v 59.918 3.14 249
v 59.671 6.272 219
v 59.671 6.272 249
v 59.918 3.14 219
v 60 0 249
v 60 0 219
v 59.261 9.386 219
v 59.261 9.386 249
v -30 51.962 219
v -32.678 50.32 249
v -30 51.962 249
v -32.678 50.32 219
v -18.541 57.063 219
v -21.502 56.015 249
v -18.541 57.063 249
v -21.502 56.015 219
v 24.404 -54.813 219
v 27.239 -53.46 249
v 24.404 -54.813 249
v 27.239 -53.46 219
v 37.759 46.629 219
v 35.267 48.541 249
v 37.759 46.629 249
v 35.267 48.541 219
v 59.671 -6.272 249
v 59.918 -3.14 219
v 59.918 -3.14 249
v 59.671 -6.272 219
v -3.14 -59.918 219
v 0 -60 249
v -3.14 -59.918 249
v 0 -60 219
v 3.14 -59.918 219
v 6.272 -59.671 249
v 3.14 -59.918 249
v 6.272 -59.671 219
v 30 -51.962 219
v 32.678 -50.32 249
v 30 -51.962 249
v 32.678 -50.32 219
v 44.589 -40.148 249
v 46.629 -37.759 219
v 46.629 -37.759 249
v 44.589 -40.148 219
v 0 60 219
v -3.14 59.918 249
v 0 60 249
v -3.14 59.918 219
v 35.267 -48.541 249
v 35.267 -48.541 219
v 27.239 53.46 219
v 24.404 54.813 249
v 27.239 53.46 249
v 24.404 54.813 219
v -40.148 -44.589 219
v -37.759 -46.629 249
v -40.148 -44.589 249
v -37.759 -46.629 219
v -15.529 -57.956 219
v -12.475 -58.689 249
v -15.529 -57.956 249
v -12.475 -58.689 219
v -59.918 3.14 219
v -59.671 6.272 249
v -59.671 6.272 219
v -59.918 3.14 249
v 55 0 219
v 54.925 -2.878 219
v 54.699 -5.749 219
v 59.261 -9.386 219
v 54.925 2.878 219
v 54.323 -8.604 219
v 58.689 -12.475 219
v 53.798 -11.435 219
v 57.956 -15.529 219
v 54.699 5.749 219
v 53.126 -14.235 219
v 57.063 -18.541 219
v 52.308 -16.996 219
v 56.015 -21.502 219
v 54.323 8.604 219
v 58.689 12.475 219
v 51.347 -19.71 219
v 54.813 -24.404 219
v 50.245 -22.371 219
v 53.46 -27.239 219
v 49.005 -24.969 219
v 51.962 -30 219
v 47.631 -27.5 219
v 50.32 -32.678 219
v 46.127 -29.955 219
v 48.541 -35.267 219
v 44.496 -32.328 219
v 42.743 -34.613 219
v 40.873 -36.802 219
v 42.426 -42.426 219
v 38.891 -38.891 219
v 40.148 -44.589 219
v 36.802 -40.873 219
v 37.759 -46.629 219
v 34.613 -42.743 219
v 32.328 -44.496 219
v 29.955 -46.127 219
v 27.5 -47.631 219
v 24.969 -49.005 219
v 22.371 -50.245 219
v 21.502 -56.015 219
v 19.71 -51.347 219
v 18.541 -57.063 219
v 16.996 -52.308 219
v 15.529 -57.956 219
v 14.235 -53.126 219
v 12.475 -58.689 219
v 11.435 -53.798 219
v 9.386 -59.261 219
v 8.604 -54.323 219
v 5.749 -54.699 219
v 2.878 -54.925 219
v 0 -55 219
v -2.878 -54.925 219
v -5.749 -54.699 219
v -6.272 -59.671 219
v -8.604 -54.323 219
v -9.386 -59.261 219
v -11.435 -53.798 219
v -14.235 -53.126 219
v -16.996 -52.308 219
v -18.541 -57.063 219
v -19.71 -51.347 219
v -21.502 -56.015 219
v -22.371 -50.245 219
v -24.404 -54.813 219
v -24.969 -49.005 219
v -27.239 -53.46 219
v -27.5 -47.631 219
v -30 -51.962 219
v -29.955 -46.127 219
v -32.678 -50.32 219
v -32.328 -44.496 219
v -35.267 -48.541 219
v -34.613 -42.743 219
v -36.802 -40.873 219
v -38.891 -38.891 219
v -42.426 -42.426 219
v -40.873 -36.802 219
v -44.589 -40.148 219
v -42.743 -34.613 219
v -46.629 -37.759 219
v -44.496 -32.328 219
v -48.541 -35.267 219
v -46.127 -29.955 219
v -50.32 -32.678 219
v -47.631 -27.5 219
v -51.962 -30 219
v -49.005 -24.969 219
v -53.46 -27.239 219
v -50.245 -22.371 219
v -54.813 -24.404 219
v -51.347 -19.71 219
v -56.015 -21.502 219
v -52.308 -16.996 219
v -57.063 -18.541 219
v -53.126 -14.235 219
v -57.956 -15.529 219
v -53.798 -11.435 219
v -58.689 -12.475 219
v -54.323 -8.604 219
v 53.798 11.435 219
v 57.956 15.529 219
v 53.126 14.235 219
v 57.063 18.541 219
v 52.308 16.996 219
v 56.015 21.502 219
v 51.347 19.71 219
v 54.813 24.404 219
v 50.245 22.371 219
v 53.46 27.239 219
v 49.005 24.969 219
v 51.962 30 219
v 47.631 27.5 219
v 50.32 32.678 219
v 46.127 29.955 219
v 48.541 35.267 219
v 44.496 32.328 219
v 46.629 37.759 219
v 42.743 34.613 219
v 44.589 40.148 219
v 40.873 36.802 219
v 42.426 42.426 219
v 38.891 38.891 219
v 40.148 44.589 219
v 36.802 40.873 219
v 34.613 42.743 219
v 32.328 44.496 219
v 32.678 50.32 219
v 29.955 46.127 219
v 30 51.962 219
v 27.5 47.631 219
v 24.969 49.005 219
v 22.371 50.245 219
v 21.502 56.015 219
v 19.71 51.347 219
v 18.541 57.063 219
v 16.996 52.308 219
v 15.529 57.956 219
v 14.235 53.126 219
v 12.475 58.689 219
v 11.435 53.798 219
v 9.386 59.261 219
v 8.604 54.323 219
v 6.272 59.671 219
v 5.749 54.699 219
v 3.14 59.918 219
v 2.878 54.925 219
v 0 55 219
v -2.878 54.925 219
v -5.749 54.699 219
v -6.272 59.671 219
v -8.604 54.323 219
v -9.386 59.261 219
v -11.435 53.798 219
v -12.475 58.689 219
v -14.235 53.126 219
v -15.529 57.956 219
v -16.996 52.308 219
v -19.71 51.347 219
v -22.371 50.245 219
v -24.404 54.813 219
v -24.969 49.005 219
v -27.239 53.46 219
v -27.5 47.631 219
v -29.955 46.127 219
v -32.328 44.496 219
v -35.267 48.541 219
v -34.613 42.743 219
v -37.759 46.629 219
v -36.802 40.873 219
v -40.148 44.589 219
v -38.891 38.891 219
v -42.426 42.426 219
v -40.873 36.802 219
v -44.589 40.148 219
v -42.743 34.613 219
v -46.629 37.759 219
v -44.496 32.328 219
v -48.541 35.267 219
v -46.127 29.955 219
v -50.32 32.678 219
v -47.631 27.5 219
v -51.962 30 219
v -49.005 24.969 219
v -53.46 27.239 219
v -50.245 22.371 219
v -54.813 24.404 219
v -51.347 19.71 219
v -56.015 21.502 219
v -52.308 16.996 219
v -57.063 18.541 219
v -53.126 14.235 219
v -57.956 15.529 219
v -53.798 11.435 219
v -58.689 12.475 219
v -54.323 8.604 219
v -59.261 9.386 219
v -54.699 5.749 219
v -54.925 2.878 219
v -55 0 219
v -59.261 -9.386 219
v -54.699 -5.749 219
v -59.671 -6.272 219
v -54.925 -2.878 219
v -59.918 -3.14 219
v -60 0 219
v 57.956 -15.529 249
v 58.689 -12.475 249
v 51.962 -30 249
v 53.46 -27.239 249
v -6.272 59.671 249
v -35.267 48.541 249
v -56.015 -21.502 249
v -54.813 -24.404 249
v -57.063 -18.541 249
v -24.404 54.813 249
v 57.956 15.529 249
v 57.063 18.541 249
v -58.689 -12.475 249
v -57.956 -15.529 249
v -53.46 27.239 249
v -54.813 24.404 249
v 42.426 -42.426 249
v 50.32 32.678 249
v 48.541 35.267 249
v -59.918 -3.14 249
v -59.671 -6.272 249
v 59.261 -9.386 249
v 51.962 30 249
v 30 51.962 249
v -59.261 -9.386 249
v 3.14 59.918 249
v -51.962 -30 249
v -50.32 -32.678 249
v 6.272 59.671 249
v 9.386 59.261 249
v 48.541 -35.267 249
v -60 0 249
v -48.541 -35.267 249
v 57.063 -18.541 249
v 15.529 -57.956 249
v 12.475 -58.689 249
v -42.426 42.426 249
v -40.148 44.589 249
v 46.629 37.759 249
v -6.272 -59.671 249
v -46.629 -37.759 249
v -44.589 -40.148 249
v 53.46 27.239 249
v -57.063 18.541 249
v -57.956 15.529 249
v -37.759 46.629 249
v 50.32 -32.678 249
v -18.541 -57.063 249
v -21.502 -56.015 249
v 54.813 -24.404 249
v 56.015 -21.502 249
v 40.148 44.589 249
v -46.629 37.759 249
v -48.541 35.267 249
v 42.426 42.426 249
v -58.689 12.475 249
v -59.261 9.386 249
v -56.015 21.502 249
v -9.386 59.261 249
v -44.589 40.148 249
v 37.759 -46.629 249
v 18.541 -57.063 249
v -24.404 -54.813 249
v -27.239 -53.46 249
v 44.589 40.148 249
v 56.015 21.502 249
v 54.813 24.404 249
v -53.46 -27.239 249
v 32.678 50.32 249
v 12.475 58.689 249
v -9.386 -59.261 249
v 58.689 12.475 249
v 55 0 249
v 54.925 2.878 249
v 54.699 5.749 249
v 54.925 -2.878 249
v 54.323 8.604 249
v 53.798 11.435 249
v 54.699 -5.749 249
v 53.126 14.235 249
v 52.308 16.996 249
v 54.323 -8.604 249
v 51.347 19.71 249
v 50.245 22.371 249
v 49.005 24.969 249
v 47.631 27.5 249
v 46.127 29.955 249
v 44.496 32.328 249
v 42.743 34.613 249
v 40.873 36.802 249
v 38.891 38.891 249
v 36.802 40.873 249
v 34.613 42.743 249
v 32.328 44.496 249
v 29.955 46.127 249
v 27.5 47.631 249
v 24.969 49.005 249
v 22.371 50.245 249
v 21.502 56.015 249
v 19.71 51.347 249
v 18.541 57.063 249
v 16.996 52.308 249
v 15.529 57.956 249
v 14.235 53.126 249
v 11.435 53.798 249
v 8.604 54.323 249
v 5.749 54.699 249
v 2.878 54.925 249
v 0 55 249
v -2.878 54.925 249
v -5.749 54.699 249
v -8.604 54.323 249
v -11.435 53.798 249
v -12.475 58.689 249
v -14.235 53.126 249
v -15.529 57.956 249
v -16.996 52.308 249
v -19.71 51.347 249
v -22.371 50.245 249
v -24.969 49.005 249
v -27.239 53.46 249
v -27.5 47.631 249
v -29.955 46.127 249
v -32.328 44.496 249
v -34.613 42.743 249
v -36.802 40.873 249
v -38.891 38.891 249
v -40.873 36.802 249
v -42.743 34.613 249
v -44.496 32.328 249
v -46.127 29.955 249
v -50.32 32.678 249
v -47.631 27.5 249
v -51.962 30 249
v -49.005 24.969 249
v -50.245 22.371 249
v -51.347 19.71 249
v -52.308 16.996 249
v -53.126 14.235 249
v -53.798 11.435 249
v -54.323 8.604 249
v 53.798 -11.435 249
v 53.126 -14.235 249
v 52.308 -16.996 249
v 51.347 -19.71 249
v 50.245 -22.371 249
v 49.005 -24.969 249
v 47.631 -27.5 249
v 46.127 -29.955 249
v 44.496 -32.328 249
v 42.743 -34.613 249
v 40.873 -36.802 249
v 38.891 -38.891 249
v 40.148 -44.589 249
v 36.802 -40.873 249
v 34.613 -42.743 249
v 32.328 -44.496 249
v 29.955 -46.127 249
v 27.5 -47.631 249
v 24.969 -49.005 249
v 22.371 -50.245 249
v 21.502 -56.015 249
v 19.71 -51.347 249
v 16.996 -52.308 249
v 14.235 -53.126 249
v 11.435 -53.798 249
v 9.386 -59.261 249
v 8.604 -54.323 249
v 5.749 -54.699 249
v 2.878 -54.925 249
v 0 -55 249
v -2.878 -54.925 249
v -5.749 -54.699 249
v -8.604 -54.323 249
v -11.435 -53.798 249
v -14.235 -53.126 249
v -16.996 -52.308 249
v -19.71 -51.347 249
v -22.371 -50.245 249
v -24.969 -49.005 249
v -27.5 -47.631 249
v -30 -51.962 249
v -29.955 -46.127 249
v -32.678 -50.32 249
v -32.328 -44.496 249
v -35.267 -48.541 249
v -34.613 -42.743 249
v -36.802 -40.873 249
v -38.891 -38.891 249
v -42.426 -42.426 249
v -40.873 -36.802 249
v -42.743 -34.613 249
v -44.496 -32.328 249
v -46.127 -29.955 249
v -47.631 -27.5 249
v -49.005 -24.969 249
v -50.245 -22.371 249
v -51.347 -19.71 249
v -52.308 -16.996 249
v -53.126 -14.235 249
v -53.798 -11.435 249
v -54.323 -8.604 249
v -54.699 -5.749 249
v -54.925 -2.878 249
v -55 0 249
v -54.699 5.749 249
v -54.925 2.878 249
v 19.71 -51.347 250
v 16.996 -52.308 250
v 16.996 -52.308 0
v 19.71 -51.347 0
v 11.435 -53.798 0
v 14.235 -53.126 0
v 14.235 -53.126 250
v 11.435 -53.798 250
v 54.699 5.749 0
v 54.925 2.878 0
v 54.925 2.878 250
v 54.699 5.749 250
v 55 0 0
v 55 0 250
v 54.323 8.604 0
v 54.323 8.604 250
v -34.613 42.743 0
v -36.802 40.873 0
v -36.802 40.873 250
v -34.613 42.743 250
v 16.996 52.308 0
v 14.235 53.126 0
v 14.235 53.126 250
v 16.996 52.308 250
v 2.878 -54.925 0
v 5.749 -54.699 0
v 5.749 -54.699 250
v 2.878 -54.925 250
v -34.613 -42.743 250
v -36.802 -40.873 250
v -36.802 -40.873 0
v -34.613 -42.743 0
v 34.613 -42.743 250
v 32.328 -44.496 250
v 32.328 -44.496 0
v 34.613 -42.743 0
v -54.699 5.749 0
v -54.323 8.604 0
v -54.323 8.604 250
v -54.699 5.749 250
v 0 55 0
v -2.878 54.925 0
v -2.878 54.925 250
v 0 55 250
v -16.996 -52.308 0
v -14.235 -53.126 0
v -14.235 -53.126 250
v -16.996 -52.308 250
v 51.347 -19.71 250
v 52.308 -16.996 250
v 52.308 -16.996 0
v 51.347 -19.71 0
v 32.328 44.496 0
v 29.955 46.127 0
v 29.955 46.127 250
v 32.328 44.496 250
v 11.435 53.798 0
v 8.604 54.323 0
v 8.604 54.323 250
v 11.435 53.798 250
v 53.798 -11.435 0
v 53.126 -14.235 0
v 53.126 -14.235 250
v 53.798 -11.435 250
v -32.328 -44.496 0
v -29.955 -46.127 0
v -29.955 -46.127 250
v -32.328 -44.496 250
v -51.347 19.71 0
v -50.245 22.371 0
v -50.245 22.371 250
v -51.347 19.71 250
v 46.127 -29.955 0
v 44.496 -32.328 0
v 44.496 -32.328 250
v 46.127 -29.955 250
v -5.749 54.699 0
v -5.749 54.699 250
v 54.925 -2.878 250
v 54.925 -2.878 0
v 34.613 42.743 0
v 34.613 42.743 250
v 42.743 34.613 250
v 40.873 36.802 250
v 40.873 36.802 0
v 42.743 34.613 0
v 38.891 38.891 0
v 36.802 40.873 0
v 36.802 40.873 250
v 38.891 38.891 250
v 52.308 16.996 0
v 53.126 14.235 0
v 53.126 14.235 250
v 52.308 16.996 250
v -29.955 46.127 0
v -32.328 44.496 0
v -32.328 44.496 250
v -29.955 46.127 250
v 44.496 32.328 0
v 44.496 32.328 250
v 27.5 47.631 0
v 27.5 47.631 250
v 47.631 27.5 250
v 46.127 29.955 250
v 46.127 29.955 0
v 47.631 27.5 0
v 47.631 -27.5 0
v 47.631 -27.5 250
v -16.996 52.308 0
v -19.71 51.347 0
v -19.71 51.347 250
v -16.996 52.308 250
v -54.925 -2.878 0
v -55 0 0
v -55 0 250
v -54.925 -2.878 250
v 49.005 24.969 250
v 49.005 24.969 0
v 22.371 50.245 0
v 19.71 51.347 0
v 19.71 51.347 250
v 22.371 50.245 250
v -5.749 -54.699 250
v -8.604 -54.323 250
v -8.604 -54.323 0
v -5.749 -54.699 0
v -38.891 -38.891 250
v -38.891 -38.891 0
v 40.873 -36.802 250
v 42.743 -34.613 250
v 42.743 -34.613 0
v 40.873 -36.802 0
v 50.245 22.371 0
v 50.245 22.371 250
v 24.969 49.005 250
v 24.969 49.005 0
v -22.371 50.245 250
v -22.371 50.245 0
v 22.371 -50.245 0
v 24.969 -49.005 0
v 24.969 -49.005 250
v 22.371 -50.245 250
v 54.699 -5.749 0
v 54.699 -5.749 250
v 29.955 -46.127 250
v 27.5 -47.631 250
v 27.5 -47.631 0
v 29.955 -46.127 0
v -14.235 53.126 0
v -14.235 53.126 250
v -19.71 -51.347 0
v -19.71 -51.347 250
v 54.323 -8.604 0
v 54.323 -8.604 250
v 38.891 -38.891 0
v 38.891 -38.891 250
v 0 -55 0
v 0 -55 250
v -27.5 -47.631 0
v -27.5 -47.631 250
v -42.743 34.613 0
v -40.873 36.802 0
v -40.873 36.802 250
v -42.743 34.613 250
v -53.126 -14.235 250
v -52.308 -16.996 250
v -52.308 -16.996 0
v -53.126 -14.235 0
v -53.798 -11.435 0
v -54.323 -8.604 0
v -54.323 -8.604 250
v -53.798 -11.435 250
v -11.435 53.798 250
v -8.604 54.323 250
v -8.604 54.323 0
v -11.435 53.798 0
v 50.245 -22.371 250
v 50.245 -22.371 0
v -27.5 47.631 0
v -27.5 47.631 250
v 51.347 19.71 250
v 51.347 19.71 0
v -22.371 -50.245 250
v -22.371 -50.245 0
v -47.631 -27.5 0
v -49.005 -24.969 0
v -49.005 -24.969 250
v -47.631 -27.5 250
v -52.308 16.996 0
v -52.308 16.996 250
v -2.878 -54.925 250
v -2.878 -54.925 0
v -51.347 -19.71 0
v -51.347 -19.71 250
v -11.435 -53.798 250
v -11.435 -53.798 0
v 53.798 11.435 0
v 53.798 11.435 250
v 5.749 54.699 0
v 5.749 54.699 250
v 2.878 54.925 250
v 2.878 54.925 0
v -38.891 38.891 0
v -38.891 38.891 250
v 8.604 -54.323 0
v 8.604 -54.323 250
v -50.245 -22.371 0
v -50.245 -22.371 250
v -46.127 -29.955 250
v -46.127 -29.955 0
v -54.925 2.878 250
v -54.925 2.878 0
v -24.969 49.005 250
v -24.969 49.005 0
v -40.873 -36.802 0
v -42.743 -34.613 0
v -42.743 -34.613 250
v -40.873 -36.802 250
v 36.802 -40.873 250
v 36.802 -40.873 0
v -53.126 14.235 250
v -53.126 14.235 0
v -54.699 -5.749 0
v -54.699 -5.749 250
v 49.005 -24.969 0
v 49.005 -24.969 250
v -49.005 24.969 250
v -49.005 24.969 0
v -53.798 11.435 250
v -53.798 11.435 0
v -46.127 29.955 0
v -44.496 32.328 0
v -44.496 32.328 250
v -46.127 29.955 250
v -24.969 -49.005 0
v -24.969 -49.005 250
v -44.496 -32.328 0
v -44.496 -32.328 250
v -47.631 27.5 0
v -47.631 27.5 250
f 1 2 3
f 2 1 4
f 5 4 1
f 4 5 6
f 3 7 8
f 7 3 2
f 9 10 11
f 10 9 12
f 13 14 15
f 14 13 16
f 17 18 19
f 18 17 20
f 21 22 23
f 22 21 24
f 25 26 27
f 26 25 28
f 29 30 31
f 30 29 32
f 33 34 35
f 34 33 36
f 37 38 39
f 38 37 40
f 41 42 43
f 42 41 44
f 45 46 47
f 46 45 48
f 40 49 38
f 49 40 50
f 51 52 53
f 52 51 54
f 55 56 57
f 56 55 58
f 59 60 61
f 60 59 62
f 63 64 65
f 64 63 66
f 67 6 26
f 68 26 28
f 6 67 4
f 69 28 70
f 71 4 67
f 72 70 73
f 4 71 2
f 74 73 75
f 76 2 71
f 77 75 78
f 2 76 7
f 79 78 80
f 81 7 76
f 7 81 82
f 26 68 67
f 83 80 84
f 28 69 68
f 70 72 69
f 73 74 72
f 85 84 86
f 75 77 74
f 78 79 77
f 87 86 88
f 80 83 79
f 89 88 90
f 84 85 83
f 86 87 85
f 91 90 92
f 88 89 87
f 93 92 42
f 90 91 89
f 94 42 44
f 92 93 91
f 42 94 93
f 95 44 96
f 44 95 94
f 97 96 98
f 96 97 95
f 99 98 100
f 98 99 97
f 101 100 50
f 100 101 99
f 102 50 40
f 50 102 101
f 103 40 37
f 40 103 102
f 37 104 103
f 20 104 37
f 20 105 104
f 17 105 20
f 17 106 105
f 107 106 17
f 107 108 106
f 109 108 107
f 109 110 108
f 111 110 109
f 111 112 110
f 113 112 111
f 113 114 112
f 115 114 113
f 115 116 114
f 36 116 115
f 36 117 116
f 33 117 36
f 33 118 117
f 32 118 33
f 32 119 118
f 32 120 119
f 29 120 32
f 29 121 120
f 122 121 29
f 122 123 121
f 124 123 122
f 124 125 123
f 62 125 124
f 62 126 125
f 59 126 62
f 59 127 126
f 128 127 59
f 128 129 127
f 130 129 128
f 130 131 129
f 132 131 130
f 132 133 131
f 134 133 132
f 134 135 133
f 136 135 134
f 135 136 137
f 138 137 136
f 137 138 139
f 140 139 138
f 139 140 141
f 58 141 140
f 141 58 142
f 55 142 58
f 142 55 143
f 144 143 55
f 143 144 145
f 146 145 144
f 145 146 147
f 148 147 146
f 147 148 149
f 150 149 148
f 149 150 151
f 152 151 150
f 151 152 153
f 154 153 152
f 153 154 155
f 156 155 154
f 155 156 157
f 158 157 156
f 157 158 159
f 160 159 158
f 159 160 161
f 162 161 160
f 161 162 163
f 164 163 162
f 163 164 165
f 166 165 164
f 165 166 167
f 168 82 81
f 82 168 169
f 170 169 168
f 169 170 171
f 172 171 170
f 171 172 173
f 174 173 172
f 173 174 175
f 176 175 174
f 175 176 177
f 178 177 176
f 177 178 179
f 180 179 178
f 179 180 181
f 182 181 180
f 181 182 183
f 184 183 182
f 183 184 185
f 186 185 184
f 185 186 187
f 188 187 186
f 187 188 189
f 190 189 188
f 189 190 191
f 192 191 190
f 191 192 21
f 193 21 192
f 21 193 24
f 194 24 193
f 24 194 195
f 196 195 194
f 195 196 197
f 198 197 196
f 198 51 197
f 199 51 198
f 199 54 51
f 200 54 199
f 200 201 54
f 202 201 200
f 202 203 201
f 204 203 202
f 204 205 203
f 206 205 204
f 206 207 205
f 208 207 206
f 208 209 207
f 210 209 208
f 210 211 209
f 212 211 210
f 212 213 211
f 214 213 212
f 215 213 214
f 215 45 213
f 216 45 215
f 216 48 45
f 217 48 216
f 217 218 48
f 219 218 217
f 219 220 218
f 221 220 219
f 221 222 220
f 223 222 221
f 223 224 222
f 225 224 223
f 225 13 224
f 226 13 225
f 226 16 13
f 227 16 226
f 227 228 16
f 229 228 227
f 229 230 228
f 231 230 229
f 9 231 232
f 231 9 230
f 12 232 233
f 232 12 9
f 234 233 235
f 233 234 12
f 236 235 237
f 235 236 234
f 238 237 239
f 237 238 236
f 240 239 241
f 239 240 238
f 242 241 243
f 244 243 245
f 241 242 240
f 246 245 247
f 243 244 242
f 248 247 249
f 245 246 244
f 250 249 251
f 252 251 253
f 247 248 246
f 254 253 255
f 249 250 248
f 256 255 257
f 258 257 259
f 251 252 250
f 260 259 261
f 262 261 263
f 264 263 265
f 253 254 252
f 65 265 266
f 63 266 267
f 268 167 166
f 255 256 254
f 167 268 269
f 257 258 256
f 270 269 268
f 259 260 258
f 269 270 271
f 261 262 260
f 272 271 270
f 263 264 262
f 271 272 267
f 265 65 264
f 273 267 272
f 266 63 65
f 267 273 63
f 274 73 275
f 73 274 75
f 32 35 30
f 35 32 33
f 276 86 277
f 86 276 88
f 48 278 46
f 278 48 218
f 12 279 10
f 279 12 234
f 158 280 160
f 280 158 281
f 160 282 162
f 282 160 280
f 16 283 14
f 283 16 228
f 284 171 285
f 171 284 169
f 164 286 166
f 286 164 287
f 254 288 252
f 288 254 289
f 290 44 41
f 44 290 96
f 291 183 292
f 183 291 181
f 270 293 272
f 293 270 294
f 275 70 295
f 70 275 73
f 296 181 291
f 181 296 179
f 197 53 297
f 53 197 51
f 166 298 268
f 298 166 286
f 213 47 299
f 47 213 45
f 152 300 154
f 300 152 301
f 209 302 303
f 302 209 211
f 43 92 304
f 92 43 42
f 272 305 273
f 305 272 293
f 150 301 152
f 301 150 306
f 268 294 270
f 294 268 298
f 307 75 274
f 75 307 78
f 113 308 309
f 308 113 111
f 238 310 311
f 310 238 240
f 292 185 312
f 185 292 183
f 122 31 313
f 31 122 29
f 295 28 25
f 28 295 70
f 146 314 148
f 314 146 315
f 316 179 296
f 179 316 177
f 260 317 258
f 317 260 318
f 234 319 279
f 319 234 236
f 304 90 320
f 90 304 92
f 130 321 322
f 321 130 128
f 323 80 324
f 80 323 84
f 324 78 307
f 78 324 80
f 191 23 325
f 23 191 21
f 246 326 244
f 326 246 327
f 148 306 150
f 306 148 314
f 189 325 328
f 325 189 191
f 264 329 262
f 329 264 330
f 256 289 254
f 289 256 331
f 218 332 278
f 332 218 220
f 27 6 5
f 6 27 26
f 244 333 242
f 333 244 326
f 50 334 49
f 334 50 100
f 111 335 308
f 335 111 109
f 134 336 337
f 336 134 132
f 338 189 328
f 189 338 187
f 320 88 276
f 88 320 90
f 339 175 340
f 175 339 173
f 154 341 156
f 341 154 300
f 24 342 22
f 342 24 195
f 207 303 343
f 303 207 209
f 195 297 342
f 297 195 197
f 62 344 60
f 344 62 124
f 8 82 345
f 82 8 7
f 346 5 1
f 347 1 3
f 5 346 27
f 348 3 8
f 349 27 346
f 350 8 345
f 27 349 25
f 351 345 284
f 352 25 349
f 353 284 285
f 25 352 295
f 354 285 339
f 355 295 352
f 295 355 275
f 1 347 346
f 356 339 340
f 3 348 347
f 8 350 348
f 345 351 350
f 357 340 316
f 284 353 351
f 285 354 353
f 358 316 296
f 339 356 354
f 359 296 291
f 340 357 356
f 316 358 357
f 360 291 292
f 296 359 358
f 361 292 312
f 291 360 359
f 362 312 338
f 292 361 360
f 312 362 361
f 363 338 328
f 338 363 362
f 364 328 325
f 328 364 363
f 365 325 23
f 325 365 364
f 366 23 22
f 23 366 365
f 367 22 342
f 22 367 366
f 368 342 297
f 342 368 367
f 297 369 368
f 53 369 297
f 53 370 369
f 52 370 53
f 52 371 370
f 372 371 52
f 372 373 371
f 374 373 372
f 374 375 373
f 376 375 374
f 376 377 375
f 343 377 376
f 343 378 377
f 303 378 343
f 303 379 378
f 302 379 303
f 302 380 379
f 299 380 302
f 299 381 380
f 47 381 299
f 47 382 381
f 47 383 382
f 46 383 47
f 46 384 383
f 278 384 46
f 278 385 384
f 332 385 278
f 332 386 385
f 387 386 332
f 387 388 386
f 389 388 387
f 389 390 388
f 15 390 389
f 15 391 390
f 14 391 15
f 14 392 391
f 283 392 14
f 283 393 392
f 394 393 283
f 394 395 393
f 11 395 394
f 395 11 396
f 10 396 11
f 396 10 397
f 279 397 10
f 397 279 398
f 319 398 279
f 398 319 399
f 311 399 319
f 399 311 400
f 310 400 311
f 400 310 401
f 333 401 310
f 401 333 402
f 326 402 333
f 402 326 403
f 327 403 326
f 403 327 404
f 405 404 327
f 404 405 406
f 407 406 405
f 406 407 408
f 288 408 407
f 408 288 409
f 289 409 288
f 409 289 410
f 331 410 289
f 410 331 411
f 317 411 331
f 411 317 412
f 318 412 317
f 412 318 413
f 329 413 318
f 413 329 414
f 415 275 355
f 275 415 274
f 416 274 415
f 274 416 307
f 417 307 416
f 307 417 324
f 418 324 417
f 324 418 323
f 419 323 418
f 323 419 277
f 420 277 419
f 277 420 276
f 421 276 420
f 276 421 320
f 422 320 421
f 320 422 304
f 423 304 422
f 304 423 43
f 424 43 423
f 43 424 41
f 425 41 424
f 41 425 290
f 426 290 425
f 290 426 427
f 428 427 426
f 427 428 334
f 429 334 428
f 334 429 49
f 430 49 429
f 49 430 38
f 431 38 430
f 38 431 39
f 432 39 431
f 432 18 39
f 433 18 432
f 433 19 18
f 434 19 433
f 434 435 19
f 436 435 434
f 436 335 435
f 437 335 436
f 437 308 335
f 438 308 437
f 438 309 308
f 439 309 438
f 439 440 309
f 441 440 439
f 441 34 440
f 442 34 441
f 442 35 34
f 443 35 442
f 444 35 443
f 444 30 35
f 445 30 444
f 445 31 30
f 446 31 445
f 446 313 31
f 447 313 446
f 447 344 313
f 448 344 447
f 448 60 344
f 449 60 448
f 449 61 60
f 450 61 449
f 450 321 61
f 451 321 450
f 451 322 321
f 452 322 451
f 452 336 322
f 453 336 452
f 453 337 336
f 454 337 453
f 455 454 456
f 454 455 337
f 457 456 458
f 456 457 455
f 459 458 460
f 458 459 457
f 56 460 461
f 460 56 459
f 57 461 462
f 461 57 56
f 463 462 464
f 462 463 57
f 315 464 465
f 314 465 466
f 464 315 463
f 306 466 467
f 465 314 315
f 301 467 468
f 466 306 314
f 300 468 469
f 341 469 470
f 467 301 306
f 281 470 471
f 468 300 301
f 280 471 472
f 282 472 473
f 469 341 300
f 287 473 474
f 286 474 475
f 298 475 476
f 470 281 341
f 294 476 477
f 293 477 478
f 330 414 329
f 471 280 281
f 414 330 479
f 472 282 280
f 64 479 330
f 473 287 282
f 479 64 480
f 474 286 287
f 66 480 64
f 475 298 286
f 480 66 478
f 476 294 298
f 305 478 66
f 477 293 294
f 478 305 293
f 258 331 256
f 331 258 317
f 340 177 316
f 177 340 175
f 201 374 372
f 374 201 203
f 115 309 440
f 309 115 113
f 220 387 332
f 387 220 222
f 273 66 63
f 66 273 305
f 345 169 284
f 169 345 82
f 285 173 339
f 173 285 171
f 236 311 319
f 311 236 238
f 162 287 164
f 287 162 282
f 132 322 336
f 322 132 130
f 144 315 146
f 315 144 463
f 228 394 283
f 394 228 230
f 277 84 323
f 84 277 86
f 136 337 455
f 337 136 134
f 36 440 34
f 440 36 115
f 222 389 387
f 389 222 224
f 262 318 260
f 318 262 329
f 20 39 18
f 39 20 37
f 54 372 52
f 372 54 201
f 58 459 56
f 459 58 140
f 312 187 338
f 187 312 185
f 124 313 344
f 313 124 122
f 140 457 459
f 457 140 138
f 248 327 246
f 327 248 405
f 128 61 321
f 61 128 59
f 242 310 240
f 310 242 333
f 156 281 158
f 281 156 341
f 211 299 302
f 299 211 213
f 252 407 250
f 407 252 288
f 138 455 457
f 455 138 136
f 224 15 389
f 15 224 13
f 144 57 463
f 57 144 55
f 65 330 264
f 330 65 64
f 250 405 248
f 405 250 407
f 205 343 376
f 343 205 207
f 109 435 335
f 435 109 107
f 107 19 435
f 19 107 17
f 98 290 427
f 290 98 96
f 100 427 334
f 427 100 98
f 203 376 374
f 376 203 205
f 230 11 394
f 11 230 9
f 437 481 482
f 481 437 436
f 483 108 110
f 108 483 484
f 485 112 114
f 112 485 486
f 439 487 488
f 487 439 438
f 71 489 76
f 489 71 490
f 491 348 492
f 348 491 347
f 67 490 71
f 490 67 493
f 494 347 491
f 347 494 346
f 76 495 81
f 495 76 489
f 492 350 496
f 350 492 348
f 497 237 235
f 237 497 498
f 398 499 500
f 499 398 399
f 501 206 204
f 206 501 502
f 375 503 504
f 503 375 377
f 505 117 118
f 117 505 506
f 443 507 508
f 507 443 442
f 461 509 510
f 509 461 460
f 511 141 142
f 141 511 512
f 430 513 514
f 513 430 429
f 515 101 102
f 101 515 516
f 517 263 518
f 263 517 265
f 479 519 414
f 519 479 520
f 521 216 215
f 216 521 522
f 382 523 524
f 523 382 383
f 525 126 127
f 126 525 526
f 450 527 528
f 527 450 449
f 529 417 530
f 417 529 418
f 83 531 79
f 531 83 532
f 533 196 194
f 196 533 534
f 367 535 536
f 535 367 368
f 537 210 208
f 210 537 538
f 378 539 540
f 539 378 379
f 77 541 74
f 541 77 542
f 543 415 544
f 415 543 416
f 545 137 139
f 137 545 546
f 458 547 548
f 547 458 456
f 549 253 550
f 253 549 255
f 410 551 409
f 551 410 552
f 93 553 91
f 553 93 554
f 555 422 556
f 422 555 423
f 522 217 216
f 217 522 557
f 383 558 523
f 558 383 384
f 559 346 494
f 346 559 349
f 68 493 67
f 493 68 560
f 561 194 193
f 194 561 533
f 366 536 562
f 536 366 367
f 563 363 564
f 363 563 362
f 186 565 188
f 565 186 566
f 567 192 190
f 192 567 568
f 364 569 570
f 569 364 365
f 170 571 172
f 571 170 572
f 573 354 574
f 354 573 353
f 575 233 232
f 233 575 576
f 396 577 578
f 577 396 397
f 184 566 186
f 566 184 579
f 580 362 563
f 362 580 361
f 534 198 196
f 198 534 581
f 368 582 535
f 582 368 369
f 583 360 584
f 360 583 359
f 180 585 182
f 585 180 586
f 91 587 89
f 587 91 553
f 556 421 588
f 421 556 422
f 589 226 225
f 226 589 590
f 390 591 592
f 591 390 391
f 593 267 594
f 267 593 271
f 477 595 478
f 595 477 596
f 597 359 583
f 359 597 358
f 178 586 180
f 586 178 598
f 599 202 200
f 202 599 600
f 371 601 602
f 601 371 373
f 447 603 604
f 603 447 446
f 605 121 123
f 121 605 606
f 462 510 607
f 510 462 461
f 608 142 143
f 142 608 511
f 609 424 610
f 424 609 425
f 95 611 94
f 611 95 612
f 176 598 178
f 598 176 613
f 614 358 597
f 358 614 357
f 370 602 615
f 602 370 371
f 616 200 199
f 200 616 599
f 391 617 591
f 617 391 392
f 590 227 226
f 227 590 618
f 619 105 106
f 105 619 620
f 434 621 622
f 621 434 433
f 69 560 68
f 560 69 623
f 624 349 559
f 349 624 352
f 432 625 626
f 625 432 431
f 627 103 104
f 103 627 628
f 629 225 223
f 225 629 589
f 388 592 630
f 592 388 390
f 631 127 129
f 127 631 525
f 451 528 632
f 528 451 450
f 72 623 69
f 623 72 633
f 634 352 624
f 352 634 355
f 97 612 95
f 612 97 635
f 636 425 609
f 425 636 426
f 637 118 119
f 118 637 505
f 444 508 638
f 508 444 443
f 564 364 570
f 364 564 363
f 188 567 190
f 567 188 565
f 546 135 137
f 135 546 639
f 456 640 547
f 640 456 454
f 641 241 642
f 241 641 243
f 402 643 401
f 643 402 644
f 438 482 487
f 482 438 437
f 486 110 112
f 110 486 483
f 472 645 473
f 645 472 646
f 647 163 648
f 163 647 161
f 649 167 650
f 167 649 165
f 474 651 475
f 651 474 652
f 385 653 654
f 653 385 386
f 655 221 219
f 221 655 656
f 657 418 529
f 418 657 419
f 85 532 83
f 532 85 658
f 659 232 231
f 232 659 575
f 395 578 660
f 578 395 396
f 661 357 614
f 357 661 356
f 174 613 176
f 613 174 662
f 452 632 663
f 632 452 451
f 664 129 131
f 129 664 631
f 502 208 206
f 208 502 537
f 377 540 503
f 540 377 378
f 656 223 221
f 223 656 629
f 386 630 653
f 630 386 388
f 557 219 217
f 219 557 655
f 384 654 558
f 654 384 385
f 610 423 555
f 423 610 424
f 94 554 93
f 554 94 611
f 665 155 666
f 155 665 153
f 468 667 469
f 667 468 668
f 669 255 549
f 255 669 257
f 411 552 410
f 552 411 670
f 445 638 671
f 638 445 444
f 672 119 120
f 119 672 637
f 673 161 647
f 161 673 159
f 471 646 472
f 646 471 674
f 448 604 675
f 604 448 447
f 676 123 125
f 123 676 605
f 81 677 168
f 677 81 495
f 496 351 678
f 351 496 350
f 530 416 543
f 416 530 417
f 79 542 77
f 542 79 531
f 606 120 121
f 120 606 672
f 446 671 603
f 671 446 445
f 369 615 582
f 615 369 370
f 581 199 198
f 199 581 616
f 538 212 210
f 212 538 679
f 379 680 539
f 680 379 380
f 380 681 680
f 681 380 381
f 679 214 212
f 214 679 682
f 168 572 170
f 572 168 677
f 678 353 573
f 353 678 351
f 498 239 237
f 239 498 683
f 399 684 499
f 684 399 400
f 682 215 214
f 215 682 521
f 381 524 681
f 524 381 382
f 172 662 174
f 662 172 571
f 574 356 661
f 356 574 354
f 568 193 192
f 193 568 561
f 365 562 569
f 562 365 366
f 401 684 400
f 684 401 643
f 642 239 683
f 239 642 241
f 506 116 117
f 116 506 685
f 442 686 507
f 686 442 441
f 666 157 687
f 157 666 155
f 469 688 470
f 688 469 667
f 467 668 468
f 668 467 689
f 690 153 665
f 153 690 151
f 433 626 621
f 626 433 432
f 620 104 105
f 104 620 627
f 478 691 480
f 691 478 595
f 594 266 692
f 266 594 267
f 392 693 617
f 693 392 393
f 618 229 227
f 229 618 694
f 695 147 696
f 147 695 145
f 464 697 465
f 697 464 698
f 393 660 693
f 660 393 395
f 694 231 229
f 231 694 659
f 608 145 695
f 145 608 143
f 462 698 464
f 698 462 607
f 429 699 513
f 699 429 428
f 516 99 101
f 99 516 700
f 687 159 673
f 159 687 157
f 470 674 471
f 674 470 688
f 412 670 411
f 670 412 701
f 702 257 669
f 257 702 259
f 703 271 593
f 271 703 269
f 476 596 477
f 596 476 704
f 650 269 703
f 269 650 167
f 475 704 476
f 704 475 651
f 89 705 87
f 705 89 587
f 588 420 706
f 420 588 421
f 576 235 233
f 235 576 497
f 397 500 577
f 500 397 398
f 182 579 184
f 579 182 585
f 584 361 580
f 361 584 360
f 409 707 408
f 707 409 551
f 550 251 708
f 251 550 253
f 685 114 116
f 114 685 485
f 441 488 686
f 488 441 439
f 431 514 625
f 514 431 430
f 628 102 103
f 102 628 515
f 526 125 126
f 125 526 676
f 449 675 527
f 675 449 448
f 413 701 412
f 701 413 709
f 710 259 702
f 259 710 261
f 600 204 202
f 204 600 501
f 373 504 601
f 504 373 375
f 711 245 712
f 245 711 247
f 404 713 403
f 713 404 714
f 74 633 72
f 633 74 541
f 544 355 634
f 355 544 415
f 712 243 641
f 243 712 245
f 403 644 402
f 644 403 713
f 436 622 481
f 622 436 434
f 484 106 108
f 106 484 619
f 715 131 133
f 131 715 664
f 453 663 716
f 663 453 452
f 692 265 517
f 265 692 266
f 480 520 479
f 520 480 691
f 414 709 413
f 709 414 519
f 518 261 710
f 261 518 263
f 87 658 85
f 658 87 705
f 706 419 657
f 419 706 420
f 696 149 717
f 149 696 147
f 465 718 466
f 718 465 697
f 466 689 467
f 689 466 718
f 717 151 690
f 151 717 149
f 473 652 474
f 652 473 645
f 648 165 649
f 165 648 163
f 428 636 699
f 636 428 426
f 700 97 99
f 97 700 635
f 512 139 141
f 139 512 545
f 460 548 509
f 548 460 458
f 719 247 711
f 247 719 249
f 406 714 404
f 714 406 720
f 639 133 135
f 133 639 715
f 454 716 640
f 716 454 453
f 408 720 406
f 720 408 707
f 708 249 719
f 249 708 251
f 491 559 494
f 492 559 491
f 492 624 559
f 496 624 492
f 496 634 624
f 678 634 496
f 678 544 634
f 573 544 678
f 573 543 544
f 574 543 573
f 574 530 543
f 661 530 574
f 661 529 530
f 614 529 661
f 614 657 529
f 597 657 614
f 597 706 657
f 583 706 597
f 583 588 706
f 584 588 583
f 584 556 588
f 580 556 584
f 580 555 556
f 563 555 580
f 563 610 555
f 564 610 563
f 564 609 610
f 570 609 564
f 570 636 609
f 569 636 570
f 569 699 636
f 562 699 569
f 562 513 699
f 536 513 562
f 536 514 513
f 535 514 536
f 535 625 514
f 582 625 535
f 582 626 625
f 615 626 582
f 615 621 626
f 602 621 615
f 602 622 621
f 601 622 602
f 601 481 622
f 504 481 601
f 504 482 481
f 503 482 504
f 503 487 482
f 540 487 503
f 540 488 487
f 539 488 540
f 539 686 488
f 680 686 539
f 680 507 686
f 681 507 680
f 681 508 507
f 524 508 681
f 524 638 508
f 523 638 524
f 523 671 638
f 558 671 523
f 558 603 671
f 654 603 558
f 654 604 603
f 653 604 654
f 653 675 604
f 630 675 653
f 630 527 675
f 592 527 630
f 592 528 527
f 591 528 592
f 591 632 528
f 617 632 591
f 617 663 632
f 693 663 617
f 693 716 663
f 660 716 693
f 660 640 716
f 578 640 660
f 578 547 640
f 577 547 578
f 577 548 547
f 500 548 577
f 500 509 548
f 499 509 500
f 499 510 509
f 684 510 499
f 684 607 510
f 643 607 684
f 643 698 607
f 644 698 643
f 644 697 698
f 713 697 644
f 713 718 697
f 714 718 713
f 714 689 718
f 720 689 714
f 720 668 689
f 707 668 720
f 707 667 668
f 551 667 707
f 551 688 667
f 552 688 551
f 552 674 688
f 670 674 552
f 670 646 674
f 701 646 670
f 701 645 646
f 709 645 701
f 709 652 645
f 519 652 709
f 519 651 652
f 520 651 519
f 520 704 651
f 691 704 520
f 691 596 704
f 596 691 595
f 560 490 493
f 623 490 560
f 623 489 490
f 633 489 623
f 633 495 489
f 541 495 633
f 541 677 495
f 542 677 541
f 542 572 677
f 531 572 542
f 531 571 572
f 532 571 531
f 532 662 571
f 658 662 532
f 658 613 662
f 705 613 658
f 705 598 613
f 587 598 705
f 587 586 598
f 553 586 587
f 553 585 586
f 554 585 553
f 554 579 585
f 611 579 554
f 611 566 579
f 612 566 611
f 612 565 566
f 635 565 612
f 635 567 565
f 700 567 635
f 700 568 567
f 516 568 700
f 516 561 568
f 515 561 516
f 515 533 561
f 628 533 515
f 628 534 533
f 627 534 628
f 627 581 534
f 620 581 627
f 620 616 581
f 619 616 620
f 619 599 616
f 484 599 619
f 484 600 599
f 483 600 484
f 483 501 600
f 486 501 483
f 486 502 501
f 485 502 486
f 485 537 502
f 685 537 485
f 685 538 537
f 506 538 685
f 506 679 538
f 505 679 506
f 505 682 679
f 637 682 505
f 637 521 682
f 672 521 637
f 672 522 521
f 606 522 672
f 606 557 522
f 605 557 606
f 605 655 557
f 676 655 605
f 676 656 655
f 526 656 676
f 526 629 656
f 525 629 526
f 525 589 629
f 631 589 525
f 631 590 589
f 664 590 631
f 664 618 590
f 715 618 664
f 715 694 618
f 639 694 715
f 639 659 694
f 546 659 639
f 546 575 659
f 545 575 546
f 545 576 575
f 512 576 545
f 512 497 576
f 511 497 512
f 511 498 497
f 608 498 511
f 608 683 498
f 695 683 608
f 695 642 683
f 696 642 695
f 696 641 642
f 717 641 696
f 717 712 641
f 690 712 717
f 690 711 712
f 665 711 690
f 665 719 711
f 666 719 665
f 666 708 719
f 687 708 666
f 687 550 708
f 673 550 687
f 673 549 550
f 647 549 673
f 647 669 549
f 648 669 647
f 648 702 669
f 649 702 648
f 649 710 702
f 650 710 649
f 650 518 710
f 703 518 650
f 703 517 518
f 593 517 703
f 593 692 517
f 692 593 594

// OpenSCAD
$fn = 120;

// HT 90 pipe 250 mm (simple exterior with one socket end)
pipe_len   = 250;
pipe_od    = 110;   // assumed outer diameter
socket_od  = 120;   // socket outer diameter
socket_h   = 30;

overlap = 1;        // small overlap to guarantee manifold union

module ht_pipe_body(h) {
    cylinder(h=h, d=pipe_od, center=false);
}

module end_fitting_socket() {
    // Solid socket ring (outer sleeve)
    difference() {
        cylinder(h=socket_h, d=socket_od, center=false);
        translate([0, 0, -overlap])
            cylinder(h=socket_h + 2*overlap, d=pipe_od, center=false);
    }
}

module ht_pipe() {
    body_h = pipe_len - socket_h;

    // Ensure ONE connected solid by overlapping the socket with the body
    union() {
        ht_pipe_body(pipe_len);
        translate([0, 0, pipe_len - socket_h - overlap])
            end_fitting_socket();
    }
}

ht_pipe();
